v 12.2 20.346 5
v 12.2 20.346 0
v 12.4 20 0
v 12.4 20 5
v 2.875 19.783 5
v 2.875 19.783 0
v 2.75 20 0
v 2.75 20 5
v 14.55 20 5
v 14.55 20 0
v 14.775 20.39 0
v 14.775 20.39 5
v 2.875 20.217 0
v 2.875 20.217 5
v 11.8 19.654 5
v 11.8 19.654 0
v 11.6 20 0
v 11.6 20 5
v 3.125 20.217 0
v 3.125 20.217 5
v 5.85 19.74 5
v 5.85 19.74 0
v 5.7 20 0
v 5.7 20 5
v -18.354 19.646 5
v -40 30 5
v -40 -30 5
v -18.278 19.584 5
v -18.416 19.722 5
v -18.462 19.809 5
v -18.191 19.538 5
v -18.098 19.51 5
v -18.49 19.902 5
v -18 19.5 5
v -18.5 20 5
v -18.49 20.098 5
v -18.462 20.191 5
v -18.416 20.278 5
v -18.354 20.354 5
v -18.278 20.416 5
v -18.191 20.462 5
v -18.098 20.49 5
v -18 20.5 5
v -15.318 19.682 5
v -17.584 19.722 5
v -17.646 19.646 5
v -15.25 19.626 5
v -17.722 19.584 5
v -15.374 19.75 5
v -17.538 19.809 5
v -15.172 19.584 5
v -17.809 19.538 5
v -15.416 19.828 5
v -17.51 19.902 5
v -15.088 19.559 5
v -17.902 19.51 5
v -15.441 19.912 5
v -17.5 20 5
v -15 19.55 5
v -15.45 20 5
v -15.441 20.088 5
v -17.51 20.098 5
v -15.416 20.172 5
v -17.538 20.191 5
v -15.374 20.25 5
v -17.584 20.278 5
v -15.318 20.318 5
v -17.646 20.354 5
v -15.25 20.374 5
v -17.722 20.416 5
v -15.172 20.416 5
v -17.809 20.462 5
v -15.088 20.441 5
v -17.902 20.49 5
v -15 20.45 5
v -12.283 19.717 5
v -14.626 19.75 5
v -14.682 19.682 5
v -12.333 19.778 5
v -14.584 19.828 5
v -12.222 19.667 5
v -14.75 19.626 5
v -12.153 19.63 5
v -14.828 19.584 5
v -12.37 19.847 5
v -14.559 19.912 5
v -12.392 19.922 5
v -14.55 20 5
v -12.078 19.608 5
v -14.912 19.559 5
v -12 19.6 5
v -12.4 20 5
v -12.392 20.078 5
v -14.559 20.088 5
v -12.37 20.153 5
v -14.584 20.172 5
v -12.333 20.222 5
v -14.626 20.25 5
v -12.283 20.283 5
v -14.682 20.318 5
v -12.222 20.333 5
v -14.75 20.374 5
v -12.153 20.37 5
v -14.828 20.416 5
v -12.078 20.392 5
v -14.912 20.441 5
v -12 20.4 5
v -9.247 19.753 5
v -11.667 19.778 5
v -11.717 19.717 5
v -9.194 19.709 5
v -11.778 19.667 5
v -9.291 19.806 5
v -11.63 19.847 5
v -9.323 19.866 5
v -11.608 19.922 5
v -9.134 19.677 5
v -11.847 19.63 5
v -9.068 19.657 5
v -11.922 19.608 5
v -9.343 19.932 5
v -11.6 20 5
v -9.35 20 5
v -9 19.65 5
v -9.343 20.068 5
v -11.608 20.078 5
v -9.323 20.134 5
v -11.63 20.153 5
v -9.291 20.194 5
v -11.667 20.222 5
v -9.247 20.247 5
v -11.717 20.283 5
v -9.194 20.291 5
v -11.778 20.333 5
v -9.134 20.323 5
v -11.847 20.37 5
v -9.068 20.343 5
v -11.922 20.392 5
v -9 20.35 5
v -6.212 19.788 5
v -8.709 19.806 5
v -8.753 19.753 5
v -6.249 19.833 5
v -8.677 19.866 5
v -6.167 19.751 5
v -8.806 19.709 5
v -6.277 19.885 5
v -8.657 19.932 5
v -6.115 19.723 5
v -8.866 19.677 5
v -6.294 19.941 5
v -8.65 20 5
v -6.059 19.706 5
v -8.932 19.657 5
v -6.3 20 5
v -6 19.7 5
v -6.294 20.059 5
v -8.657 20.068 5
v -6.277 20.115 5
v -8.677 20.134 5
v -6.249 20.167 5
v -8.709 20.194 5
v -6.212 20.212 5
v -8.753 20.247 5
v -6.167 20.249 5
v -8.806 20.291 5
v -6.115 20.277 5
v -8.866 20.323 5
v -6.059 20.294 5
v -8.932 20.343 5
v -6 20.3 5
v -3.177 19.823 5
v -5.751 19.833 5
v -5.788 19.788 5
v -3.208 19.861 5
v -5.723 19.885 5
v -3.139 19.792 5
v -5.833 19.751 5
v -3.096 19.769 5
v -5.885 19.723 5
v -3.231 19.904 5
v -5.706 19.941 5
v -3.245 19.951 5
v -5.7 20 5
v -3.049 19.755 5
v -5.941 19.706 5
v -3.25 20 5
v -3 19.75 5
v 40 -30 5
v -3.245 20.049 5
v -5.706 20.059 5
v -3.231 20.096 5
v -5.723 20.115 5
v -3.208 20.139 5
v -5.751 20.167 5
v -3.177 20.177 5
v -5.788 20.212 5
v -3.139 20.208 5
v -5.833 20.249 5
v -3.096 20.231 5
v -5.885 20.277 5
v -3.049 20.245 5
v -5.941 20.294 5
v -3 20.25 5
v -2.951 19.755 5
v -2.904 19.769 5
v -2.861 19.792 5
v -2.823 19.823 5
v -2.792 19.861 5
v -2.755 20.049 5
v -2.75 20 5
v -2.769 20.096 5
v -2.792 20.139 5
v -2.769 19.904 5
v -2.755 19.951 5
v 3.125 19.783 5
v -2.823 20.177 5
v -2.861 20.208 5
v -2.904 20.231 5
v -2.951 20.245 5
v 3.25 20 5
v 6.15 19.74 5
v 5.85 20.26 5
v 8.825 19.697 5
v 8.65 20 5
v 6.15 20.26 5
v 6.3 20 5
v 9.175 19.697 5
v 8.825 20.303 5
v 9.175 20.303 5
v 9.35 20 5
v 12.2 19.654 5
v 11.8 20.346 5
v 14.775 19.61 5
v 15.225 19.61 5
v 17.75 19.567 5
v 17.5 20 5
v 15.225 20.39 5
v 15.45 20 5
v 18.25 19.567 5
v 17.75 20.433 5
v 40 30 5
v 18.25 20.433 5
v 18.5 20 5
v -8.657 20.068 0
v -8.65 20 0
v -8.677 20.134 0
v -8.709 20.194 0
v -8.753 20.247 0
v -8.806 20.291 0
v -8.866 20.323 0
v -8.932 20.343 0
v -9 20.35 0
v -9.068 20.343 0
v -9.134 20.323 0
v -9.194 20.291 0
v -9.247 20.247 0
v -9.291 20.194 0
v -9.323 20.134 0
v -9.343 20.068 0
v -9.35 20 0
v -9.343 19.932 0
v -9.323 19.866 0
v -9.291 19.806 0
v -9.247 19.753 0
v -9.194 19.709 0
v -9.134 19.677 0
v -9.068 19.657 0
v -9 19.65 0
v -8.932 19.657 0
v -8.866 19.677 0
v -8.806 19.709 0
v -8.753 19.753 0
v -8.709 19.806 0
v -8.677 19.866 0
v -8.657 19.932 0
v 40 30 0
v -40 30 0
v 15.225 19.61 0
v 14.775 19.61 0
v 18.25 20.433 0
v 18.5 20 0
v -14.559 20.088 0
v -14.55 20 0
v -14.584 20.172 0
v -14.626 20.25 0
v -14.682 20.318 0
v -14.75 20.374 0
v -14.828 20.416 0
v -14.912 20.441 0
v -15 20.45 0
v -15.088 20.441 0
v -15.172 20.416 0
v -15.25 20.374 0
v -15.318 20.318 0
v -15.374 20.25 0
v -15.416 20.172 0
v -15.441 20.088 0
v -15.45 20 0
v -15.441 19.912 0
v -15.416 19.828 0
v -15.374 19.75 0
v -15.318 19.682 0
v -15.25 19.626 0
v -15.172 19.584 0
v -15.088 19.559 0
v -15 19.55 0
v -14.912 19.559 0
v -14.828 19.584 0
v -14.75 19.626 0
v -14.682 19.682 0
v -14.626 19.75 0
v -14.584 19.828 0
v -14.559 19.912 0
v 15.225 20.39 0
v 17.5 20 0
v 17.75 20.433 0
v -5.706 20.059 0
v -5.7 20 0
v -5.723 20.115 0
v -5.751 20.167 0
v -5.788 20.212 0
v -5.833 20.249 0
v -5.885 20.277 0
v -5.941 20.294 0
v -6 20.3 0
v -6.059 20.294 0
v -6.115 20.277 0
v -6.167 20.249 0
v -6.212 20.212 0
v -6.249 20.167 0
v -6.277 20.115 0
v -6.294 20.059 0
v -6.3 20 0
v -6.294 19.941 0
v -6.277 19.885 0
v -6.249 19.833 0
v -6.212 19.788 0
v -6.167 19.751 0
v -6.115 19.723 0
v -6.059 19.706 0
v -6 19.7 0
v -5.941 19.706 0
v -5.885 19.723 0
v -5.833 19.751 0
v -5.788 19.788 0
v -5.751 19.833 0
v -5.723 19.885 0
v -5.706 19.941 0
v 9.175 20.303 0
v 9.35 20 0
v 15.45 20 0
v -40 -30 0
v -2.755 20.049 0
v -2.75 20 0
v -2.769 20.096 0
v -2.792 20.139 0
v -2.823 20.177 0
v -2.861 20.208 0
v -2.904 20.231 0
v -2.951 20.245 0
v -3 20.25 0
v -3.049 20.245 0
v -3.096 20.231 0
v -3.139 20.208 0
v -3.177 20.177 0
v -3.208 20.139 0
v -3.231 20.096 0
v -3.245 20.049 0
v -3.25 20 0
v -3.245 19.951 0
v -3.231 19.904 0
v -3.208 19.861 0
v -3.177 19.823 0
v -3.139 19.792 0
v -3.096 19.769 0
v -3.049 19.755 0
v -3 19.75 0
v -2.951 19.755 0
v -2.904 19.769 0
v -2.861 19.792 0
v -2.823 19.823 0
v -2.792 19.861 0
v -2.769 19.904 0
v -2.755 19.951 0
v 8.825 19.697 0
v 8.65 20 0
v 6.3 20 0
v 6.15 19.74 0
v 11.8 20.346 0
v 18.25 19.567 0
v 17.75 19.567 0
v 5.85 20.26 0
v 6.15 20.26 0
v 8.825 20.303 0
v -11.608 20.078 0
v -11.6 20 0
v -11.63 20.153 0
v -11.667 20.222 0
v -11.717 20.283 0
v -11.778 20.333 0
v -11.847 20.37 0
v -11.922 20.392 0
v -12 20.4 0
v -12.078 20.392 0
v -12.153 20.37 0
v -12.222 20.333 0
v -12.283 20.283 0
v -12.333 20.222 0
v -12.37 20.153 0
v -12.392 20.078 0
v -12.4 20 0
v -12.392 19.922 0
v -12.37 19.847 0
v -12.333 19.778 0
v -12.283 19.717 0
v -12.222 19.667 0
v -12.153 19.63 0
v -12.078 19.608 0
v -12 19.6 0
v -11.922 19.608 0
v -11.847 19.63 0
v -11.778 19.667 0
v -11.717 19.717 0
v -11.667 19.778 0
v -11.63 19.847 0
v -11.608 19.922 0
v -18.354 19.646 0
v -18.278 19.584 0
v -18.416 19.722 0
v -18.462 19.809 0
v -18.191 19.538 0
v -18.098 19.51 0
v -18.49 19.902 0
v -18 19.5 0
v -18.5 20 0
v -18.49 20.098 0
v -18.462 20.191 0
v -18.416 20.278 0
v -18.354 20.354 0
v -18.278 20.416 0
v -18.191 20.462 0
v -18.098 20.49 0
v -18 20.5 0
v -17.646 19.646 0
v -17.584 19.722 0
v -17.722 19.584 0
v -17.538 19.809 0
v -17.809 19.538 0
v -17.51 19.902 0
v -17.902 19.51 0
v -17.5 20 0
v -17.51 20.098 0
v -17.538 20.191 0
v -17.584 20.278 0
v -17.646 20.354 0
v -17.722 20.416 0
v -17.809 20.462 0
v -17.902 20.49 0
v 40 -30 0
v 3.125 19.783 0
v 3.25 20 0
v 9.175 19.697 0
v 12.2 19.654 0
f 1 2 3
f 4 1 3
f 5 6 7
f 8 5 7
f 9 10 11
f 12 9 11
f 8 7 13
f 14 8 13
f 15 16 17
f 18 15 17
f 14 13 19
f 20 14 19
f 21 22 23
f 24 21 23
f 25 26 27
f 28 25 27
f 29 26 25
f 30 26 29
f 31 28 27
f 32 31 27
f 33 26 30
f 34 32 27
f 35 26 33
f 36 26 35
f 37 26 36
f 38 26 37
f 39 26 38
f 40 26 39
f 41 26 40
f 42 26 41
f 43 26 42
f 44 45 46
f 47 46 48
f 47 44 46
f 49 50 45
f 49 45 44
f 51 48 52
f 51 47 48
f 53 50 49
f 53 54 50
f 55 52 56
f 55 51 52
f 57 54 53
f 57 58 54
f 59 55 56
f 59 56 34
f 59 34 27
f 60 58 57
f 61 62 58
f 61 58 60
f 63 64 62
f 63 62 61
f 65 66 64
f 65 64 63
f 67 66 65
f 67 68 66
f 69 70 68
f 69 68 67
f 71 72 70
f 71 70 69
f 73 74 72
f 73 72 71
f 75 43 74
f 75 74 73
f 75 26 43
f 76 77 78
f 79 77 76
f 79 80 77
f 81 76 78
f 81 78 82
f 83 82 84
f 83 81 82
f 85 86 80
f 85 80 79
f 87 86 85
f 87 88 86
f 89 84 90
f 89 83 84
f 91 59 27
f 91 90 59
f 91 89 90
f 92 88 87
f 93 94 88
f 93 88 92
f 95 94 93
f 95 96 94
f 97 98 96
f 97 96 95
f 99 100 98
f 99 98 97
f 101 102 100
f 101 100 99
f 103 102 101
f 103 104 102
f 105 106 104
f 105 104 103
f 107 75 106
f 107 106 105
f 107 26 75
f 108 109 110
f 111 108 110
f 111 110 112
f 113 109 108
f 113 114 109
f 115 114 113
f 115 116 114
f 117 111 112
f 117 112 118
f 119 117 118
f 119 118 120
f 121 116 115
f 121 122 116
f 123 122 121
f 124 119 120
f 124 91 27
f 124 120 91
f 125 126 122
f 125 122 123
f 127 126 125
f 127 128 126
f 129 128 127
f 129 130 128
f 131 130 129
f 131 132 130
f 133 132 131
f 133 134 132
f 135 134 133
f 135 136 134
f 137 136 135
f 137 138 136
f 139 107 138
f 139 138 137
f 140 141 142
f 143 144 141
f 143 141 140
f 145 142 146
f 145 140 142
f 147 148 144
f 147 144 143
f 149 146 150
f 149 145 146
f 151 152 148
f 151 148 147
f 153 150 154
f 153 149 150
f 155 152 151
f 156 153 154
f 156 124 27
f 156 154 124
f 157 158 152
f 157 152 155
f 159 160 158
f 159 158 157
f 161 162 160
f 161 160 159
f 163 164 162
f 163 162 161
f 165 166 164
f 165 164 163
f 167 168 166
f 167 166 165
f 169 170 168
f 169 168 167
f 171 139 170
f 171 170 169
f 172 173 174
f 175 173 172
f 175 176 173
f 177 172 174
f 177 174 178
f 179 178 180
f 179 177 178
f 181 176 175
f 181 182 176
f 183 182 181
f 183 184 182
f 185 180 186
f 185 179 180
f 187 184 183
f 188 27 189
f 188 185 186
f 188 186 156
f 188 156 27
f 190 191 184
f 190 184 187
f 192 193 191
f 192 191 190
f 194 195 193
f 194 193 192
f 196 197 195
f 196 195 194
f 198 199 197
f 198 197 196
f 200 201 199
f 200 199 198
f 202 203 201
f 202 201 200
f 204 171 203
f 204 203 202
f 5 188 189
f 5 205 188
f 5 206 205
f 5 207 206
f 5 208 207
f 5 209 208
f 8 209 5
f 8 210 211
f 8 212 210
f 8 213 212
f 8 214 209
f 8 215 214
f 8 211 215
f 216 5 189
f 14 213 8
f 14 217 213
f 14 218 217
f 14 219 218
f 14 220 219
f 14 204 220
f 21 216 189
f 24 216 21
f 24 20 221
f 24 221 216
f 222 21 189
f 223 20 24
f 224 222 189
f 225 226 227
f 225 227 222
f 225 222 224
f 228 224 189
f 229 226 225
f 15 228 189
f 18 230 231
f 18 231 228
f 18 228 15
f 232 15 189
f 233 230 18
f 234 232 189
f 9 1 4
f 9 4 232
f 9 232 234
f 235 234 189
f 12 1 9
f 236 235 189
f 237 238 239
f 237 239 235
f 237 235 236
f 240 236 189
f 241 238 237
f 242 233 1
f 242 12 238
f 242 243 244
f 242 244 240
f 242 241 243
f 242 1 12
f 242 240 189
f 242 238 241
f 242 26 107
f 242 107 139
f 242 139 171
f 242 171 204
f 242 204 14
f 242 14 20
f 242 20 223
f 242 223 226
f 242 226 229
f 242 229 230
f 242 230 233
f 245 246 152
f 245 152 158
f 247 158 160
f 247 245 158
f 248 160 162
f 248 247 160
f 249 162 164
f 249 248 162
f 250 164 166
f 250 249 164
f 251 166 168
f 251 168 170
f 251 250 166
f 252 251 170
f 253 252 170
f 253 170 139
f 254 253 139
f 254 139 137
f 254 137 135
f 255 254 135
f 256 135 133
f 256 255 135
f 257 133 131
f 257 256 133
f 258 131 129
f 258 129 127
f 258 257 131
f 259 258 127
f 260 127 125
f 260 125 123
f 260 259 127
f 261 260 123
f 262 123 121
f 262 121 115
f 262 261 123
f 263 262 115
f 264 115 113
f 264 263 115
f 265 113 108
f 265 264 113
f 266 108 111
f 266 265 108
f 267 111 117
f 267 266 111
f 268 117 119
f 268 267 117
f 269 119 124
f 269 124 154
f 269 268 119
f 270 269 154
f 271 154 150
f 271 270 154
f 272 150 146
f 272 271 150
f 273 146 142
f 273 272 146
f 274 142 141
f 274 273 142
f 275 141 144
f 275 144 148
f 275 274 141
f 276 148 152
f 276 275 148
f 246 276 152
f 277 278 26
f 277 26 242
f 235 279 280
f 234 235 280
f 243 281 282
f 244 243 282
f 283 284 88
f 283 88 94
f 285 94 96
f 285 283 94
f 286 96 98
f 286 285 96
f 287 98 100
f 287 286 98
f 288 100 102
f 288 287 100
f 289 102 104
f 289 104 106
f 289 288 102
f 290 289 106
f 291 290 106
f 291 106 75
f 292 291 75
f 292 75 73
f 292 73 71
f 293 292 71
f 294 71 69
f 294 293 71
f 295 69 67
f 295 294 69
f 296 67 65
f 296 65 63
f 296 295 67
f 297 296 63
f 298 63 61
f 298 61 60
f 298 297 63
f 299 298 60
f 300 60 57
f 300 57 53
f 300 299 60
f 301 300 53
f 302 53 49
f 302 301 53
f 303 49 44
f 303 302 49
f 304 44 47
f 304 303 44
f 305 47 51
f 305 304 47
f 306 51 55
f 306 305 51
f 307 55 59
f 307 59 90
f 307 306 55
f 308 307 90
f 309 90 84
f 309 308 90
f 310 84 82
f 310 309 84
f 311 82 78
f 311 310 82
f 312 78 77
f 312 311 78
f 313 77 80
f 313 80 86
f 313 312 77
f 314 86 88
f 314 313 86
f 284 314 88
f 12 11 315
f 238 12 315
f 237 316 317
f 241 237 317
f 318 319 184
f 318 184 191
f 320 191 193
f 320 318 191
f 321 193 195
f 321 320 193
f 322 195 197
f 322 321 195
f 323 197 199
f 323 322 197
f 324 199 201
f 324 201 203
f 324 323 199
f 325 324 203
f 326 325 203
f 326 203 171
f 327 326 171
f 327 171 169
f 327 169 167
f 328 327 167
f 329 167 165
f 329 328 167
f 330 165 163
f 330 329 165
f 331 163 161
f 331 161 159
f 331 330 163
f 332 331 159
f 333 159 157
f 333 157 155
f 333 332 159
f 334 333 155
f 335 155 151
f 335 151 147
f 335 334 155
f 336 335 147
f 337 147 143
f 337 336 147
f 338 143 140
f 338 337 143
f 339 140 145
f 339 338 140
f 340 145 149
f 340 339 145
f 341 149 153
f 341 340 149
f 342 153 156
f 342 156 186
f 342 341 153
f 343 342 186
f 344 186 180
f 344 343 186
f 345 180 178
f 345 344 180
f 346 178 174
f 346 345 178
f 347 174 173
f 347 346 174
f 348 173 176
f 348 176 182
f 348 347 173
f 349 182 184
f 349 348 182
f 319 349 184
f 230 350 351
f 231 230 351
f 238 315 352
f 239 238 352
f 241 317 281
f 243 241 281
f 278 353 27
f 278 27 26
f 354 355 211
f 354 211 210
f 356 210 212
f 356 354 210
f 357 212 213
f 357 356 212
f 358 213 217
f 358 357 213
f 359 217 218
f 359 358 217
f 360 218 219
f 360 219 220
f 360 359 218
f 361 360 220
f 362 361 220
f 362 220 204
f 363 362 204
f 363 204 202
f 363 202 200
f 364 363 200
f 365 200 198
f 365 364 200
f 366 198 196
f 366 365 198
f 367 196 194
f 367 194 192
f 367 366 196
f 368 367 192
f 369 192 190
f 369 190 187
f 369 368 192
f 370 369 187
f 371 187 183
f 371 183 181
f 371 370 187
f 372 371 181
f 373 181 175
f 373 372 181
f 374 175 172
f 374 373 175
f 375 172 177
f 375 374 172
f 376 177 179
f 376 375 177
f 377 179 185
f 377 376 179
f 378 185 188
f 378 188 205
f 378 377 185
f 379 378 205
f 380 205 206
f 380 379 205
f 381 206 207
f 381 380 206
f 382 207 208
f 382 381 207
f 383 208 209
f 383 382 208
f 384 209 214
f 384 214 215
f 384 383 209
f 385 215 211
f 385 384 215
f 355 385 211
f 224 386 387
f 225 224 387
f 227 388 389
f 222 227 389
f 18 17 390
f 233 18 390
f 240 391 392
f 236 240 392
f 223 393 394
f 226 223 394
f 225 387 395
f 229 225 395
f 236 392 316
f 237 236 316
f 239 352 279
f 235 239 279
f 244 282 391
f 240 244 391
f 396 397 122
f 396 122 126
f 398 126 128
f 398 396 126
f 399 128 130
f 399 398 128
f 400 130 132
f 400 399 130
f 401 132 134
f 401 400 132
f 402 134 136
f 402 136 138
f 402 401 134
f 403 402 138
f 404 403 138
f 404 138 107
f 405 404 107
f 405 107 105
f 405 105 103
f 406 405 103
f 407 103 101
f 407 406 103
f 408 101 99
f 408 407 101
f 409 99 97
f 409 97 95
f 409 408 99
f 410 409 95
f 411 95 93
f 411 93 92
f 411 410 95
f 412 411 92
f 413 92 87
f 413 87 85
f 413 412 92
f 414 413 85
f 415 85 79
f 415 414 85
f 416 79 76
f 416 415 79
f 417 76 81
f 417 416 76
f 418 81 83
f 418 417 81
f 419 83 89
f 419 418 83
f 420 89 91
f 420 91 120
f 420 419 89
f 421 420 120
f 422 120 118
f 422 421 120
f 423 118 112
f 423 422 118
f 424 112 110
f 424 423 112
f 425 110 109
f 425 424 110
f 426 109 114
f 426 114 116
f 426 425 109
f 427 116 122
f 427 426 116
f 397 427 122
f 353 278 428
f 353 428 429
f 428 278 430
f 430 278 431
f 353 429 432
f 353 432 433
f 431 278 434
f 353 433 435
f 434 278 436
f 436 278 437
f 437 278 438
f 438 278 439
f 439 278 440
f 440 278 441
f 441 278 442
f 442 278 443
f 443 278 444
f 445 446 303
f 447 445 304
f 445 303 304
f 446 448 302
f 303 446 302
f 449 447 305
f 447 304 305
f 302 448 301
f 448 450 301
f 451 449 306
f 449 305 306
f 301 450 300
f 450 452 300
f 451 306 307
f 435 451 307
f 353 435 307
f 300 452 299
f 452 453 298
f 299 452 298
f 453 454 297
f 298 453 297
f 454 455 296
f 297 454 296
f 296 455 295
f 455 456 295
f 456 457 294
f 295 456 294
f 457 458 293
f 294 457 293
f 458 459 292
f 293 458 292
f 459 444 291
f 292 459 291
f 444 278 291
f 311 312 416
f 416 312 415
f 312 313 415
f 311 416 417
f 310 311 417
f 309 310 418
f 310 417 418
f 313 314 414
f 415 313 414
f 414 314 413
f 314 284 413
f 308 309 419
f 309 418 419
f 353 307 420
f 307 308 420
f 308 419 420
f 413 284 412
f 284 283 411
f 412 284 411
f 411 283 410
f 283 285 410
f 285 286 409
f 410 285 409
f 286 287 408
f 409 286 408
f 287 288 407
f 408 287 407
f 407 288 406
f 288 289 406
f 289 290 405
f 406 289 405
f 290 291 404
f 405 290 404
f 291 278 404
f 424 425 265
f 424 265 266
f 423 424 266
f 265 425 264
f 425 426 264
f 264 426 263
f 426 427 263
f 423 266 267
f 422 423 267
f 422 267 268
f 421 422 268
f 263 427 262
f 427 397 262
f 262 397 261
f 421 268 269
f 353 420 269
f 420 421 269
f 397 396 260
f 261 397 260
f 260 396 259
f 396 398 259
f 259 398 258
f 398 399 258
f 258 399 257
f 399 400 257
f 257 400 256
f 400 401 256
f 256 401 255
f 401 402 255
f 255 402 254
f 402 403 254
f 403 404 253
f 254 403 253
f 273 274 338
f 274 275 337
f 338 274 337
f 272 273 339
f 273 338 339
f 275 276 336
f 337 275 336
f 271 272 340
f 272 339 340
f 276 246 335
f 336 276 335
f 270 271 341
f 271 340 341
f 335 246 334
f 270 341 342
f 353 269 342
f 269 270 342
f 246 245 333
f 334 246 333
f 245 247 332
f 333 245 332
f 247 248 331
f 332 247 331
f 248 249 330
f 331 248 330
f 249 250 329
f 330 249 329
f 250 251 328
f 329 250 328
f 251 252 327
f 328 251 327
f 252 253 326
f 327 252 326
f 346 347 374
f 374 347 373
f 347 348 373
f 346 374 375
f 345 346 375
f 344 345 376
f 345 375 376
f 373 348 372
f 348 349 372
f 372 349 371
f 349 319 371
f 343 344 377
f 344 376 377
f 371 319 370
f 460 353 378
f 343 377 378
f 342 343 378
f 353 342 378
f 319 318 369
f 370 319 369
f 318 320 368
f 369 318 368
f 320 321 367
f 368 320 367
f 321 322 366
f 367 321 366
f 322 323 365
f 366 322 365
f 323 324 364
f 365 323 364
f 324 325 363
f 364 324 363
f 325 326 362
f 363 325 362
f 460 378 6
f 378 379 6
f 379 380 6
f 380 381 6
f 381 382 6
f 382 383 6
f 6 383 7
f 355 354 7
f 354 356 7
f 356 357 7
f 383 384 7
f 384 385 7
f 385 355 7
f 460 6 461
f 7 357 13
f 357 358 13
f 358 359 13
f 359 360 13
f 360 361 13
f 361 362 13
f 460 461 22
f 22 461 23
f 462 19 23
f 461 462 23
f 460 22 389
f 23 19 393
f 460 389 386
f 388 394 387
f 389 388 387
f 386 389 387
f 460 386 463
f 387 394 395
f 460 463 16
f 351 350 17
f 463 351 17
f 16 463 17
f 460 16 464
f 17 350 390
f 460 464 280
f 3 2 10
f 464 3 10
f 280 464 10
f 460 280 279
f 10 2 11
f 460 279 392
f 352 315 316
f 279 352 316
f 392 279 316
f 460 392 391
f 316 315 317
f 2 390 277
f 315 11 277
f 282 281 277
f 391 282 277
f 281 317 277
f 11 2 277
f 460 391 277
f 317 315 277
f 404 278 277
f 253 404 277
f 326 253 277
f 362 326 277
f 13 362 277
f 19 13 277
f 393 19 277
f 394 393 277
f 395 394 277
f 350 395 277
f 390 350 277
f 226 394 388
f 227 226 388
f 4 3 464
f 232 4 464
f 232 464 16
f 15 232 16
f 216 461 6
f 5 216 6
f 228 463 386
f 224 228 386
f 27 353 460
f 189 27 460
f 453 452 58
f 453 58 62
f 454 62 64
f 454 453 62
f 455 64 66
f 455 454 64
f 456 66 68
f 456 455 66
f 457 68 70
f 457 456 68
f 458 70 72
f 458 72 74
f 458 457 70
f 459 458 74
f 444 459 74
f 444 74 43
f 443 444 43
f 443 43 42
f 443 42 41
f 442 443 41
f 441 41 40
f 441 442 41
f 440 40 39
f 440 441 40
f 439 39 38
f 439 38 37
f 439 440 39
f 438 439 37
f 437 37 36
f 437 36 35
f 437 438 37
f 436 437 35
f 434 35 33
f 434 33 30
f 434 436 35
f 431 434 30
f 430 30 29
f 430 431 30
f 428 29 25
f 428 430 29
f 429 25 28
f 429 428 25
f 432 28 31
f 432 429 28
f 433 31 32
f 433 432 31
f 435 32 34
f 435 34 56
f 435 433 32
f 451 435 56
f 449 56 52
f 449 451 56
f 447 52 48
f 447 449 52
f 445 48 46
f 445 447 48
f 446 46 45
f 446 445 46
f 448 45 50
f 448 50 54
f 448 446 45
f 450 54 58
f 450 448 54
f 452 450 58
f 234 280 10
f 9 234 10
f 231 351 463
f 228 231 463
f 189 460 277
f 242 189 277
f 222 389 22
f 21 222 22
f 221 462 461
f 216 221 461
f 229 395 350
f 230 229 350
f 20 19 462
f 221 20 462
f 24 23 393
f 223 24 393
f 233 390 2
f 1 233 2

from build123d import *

# Parameters (mm, degrees)
F0_W     = 80
F0_H     = 60
F0_R     = 0.5
F0_R_2   = 0.45
F0_R_3   = 0.4
F0_R_4   = 0.35
F0_R_5   = 0.3
F0_R_6   = 0.25
F1_DEPTH = 5


with BuildPart() as f1:
    # F0 (on Top) → F1 (new body)
    with BuildSketch(Plane.XY):
        Rectangle(F0_W, F0_H)
        with Locations((-18, 20)):
            Circle(F0_R, mode=Mode.SUBTRACT)
        with Locations((-15, 20)):
            Circle(F0_R_2, mode=Mode.SUBTRACT)
        with Locations((-12, 20)):
            Circle(F0_R_3, mode=Mode.SUBTRACT)
        with Locations((-9, 20)):
            Circle(F0_R_4, mode=Mode.SUBTRACT)
        with Locations((-6, 20)):
            Circle(F0_R_5, mode=Mode.SUBTRACT)
        with Locations((-3, 20)):
            Circle(F0_R_6, mode=Mode.SUBTRACT)
        Polygon((2.875, 20.216506), (3.125, 20.216506), (3.25, 20), (3.125, 19.783494), (2.875, 19.783494), (2.75, 20), align=None, mode=Mode.SUBTRACT)
        Polygon((5.85, 20.259808), (6.15, 20.259808), (6.3, 20), (6.15, 19.740192), (5.85, 19.740192), (5.7, 20), align=None, mode=Mode.SUBTRACT)
        Polygon((8.825, 20.303109), (9.175, 20.303109), (9.35, 20), (9.175, 19.696891), (8.825, 19.696891), (8.65, 20), align=None, mode=Mode.SUBTRACT)
        Polygon((11.8, 20.34641), (12.2, 20.34641), (12.4, 20), (12.2, 19.65359), (11.8, 19.65359), (11.6, 20), align=None, mode=Mode.SUBTRACT)
        Polygon((14.775, 20.389711), (15.225, 20.389711), (15.45, 20), (15.225, 19.610289), (14.775, 19.610289), (14.55, 20), align=None, mode=Mode.SUBTRACT)
        Polygon((18.5, 20), (18.25, 19.566987), (17.75, 19.566987), (17.5, 20), (17.75, 20.433013), (18.25, 20.433013), align=None, mode=Mode.SUBTRACT)
    extrude(amount=F1_DEPTH)


solid = f1.part
